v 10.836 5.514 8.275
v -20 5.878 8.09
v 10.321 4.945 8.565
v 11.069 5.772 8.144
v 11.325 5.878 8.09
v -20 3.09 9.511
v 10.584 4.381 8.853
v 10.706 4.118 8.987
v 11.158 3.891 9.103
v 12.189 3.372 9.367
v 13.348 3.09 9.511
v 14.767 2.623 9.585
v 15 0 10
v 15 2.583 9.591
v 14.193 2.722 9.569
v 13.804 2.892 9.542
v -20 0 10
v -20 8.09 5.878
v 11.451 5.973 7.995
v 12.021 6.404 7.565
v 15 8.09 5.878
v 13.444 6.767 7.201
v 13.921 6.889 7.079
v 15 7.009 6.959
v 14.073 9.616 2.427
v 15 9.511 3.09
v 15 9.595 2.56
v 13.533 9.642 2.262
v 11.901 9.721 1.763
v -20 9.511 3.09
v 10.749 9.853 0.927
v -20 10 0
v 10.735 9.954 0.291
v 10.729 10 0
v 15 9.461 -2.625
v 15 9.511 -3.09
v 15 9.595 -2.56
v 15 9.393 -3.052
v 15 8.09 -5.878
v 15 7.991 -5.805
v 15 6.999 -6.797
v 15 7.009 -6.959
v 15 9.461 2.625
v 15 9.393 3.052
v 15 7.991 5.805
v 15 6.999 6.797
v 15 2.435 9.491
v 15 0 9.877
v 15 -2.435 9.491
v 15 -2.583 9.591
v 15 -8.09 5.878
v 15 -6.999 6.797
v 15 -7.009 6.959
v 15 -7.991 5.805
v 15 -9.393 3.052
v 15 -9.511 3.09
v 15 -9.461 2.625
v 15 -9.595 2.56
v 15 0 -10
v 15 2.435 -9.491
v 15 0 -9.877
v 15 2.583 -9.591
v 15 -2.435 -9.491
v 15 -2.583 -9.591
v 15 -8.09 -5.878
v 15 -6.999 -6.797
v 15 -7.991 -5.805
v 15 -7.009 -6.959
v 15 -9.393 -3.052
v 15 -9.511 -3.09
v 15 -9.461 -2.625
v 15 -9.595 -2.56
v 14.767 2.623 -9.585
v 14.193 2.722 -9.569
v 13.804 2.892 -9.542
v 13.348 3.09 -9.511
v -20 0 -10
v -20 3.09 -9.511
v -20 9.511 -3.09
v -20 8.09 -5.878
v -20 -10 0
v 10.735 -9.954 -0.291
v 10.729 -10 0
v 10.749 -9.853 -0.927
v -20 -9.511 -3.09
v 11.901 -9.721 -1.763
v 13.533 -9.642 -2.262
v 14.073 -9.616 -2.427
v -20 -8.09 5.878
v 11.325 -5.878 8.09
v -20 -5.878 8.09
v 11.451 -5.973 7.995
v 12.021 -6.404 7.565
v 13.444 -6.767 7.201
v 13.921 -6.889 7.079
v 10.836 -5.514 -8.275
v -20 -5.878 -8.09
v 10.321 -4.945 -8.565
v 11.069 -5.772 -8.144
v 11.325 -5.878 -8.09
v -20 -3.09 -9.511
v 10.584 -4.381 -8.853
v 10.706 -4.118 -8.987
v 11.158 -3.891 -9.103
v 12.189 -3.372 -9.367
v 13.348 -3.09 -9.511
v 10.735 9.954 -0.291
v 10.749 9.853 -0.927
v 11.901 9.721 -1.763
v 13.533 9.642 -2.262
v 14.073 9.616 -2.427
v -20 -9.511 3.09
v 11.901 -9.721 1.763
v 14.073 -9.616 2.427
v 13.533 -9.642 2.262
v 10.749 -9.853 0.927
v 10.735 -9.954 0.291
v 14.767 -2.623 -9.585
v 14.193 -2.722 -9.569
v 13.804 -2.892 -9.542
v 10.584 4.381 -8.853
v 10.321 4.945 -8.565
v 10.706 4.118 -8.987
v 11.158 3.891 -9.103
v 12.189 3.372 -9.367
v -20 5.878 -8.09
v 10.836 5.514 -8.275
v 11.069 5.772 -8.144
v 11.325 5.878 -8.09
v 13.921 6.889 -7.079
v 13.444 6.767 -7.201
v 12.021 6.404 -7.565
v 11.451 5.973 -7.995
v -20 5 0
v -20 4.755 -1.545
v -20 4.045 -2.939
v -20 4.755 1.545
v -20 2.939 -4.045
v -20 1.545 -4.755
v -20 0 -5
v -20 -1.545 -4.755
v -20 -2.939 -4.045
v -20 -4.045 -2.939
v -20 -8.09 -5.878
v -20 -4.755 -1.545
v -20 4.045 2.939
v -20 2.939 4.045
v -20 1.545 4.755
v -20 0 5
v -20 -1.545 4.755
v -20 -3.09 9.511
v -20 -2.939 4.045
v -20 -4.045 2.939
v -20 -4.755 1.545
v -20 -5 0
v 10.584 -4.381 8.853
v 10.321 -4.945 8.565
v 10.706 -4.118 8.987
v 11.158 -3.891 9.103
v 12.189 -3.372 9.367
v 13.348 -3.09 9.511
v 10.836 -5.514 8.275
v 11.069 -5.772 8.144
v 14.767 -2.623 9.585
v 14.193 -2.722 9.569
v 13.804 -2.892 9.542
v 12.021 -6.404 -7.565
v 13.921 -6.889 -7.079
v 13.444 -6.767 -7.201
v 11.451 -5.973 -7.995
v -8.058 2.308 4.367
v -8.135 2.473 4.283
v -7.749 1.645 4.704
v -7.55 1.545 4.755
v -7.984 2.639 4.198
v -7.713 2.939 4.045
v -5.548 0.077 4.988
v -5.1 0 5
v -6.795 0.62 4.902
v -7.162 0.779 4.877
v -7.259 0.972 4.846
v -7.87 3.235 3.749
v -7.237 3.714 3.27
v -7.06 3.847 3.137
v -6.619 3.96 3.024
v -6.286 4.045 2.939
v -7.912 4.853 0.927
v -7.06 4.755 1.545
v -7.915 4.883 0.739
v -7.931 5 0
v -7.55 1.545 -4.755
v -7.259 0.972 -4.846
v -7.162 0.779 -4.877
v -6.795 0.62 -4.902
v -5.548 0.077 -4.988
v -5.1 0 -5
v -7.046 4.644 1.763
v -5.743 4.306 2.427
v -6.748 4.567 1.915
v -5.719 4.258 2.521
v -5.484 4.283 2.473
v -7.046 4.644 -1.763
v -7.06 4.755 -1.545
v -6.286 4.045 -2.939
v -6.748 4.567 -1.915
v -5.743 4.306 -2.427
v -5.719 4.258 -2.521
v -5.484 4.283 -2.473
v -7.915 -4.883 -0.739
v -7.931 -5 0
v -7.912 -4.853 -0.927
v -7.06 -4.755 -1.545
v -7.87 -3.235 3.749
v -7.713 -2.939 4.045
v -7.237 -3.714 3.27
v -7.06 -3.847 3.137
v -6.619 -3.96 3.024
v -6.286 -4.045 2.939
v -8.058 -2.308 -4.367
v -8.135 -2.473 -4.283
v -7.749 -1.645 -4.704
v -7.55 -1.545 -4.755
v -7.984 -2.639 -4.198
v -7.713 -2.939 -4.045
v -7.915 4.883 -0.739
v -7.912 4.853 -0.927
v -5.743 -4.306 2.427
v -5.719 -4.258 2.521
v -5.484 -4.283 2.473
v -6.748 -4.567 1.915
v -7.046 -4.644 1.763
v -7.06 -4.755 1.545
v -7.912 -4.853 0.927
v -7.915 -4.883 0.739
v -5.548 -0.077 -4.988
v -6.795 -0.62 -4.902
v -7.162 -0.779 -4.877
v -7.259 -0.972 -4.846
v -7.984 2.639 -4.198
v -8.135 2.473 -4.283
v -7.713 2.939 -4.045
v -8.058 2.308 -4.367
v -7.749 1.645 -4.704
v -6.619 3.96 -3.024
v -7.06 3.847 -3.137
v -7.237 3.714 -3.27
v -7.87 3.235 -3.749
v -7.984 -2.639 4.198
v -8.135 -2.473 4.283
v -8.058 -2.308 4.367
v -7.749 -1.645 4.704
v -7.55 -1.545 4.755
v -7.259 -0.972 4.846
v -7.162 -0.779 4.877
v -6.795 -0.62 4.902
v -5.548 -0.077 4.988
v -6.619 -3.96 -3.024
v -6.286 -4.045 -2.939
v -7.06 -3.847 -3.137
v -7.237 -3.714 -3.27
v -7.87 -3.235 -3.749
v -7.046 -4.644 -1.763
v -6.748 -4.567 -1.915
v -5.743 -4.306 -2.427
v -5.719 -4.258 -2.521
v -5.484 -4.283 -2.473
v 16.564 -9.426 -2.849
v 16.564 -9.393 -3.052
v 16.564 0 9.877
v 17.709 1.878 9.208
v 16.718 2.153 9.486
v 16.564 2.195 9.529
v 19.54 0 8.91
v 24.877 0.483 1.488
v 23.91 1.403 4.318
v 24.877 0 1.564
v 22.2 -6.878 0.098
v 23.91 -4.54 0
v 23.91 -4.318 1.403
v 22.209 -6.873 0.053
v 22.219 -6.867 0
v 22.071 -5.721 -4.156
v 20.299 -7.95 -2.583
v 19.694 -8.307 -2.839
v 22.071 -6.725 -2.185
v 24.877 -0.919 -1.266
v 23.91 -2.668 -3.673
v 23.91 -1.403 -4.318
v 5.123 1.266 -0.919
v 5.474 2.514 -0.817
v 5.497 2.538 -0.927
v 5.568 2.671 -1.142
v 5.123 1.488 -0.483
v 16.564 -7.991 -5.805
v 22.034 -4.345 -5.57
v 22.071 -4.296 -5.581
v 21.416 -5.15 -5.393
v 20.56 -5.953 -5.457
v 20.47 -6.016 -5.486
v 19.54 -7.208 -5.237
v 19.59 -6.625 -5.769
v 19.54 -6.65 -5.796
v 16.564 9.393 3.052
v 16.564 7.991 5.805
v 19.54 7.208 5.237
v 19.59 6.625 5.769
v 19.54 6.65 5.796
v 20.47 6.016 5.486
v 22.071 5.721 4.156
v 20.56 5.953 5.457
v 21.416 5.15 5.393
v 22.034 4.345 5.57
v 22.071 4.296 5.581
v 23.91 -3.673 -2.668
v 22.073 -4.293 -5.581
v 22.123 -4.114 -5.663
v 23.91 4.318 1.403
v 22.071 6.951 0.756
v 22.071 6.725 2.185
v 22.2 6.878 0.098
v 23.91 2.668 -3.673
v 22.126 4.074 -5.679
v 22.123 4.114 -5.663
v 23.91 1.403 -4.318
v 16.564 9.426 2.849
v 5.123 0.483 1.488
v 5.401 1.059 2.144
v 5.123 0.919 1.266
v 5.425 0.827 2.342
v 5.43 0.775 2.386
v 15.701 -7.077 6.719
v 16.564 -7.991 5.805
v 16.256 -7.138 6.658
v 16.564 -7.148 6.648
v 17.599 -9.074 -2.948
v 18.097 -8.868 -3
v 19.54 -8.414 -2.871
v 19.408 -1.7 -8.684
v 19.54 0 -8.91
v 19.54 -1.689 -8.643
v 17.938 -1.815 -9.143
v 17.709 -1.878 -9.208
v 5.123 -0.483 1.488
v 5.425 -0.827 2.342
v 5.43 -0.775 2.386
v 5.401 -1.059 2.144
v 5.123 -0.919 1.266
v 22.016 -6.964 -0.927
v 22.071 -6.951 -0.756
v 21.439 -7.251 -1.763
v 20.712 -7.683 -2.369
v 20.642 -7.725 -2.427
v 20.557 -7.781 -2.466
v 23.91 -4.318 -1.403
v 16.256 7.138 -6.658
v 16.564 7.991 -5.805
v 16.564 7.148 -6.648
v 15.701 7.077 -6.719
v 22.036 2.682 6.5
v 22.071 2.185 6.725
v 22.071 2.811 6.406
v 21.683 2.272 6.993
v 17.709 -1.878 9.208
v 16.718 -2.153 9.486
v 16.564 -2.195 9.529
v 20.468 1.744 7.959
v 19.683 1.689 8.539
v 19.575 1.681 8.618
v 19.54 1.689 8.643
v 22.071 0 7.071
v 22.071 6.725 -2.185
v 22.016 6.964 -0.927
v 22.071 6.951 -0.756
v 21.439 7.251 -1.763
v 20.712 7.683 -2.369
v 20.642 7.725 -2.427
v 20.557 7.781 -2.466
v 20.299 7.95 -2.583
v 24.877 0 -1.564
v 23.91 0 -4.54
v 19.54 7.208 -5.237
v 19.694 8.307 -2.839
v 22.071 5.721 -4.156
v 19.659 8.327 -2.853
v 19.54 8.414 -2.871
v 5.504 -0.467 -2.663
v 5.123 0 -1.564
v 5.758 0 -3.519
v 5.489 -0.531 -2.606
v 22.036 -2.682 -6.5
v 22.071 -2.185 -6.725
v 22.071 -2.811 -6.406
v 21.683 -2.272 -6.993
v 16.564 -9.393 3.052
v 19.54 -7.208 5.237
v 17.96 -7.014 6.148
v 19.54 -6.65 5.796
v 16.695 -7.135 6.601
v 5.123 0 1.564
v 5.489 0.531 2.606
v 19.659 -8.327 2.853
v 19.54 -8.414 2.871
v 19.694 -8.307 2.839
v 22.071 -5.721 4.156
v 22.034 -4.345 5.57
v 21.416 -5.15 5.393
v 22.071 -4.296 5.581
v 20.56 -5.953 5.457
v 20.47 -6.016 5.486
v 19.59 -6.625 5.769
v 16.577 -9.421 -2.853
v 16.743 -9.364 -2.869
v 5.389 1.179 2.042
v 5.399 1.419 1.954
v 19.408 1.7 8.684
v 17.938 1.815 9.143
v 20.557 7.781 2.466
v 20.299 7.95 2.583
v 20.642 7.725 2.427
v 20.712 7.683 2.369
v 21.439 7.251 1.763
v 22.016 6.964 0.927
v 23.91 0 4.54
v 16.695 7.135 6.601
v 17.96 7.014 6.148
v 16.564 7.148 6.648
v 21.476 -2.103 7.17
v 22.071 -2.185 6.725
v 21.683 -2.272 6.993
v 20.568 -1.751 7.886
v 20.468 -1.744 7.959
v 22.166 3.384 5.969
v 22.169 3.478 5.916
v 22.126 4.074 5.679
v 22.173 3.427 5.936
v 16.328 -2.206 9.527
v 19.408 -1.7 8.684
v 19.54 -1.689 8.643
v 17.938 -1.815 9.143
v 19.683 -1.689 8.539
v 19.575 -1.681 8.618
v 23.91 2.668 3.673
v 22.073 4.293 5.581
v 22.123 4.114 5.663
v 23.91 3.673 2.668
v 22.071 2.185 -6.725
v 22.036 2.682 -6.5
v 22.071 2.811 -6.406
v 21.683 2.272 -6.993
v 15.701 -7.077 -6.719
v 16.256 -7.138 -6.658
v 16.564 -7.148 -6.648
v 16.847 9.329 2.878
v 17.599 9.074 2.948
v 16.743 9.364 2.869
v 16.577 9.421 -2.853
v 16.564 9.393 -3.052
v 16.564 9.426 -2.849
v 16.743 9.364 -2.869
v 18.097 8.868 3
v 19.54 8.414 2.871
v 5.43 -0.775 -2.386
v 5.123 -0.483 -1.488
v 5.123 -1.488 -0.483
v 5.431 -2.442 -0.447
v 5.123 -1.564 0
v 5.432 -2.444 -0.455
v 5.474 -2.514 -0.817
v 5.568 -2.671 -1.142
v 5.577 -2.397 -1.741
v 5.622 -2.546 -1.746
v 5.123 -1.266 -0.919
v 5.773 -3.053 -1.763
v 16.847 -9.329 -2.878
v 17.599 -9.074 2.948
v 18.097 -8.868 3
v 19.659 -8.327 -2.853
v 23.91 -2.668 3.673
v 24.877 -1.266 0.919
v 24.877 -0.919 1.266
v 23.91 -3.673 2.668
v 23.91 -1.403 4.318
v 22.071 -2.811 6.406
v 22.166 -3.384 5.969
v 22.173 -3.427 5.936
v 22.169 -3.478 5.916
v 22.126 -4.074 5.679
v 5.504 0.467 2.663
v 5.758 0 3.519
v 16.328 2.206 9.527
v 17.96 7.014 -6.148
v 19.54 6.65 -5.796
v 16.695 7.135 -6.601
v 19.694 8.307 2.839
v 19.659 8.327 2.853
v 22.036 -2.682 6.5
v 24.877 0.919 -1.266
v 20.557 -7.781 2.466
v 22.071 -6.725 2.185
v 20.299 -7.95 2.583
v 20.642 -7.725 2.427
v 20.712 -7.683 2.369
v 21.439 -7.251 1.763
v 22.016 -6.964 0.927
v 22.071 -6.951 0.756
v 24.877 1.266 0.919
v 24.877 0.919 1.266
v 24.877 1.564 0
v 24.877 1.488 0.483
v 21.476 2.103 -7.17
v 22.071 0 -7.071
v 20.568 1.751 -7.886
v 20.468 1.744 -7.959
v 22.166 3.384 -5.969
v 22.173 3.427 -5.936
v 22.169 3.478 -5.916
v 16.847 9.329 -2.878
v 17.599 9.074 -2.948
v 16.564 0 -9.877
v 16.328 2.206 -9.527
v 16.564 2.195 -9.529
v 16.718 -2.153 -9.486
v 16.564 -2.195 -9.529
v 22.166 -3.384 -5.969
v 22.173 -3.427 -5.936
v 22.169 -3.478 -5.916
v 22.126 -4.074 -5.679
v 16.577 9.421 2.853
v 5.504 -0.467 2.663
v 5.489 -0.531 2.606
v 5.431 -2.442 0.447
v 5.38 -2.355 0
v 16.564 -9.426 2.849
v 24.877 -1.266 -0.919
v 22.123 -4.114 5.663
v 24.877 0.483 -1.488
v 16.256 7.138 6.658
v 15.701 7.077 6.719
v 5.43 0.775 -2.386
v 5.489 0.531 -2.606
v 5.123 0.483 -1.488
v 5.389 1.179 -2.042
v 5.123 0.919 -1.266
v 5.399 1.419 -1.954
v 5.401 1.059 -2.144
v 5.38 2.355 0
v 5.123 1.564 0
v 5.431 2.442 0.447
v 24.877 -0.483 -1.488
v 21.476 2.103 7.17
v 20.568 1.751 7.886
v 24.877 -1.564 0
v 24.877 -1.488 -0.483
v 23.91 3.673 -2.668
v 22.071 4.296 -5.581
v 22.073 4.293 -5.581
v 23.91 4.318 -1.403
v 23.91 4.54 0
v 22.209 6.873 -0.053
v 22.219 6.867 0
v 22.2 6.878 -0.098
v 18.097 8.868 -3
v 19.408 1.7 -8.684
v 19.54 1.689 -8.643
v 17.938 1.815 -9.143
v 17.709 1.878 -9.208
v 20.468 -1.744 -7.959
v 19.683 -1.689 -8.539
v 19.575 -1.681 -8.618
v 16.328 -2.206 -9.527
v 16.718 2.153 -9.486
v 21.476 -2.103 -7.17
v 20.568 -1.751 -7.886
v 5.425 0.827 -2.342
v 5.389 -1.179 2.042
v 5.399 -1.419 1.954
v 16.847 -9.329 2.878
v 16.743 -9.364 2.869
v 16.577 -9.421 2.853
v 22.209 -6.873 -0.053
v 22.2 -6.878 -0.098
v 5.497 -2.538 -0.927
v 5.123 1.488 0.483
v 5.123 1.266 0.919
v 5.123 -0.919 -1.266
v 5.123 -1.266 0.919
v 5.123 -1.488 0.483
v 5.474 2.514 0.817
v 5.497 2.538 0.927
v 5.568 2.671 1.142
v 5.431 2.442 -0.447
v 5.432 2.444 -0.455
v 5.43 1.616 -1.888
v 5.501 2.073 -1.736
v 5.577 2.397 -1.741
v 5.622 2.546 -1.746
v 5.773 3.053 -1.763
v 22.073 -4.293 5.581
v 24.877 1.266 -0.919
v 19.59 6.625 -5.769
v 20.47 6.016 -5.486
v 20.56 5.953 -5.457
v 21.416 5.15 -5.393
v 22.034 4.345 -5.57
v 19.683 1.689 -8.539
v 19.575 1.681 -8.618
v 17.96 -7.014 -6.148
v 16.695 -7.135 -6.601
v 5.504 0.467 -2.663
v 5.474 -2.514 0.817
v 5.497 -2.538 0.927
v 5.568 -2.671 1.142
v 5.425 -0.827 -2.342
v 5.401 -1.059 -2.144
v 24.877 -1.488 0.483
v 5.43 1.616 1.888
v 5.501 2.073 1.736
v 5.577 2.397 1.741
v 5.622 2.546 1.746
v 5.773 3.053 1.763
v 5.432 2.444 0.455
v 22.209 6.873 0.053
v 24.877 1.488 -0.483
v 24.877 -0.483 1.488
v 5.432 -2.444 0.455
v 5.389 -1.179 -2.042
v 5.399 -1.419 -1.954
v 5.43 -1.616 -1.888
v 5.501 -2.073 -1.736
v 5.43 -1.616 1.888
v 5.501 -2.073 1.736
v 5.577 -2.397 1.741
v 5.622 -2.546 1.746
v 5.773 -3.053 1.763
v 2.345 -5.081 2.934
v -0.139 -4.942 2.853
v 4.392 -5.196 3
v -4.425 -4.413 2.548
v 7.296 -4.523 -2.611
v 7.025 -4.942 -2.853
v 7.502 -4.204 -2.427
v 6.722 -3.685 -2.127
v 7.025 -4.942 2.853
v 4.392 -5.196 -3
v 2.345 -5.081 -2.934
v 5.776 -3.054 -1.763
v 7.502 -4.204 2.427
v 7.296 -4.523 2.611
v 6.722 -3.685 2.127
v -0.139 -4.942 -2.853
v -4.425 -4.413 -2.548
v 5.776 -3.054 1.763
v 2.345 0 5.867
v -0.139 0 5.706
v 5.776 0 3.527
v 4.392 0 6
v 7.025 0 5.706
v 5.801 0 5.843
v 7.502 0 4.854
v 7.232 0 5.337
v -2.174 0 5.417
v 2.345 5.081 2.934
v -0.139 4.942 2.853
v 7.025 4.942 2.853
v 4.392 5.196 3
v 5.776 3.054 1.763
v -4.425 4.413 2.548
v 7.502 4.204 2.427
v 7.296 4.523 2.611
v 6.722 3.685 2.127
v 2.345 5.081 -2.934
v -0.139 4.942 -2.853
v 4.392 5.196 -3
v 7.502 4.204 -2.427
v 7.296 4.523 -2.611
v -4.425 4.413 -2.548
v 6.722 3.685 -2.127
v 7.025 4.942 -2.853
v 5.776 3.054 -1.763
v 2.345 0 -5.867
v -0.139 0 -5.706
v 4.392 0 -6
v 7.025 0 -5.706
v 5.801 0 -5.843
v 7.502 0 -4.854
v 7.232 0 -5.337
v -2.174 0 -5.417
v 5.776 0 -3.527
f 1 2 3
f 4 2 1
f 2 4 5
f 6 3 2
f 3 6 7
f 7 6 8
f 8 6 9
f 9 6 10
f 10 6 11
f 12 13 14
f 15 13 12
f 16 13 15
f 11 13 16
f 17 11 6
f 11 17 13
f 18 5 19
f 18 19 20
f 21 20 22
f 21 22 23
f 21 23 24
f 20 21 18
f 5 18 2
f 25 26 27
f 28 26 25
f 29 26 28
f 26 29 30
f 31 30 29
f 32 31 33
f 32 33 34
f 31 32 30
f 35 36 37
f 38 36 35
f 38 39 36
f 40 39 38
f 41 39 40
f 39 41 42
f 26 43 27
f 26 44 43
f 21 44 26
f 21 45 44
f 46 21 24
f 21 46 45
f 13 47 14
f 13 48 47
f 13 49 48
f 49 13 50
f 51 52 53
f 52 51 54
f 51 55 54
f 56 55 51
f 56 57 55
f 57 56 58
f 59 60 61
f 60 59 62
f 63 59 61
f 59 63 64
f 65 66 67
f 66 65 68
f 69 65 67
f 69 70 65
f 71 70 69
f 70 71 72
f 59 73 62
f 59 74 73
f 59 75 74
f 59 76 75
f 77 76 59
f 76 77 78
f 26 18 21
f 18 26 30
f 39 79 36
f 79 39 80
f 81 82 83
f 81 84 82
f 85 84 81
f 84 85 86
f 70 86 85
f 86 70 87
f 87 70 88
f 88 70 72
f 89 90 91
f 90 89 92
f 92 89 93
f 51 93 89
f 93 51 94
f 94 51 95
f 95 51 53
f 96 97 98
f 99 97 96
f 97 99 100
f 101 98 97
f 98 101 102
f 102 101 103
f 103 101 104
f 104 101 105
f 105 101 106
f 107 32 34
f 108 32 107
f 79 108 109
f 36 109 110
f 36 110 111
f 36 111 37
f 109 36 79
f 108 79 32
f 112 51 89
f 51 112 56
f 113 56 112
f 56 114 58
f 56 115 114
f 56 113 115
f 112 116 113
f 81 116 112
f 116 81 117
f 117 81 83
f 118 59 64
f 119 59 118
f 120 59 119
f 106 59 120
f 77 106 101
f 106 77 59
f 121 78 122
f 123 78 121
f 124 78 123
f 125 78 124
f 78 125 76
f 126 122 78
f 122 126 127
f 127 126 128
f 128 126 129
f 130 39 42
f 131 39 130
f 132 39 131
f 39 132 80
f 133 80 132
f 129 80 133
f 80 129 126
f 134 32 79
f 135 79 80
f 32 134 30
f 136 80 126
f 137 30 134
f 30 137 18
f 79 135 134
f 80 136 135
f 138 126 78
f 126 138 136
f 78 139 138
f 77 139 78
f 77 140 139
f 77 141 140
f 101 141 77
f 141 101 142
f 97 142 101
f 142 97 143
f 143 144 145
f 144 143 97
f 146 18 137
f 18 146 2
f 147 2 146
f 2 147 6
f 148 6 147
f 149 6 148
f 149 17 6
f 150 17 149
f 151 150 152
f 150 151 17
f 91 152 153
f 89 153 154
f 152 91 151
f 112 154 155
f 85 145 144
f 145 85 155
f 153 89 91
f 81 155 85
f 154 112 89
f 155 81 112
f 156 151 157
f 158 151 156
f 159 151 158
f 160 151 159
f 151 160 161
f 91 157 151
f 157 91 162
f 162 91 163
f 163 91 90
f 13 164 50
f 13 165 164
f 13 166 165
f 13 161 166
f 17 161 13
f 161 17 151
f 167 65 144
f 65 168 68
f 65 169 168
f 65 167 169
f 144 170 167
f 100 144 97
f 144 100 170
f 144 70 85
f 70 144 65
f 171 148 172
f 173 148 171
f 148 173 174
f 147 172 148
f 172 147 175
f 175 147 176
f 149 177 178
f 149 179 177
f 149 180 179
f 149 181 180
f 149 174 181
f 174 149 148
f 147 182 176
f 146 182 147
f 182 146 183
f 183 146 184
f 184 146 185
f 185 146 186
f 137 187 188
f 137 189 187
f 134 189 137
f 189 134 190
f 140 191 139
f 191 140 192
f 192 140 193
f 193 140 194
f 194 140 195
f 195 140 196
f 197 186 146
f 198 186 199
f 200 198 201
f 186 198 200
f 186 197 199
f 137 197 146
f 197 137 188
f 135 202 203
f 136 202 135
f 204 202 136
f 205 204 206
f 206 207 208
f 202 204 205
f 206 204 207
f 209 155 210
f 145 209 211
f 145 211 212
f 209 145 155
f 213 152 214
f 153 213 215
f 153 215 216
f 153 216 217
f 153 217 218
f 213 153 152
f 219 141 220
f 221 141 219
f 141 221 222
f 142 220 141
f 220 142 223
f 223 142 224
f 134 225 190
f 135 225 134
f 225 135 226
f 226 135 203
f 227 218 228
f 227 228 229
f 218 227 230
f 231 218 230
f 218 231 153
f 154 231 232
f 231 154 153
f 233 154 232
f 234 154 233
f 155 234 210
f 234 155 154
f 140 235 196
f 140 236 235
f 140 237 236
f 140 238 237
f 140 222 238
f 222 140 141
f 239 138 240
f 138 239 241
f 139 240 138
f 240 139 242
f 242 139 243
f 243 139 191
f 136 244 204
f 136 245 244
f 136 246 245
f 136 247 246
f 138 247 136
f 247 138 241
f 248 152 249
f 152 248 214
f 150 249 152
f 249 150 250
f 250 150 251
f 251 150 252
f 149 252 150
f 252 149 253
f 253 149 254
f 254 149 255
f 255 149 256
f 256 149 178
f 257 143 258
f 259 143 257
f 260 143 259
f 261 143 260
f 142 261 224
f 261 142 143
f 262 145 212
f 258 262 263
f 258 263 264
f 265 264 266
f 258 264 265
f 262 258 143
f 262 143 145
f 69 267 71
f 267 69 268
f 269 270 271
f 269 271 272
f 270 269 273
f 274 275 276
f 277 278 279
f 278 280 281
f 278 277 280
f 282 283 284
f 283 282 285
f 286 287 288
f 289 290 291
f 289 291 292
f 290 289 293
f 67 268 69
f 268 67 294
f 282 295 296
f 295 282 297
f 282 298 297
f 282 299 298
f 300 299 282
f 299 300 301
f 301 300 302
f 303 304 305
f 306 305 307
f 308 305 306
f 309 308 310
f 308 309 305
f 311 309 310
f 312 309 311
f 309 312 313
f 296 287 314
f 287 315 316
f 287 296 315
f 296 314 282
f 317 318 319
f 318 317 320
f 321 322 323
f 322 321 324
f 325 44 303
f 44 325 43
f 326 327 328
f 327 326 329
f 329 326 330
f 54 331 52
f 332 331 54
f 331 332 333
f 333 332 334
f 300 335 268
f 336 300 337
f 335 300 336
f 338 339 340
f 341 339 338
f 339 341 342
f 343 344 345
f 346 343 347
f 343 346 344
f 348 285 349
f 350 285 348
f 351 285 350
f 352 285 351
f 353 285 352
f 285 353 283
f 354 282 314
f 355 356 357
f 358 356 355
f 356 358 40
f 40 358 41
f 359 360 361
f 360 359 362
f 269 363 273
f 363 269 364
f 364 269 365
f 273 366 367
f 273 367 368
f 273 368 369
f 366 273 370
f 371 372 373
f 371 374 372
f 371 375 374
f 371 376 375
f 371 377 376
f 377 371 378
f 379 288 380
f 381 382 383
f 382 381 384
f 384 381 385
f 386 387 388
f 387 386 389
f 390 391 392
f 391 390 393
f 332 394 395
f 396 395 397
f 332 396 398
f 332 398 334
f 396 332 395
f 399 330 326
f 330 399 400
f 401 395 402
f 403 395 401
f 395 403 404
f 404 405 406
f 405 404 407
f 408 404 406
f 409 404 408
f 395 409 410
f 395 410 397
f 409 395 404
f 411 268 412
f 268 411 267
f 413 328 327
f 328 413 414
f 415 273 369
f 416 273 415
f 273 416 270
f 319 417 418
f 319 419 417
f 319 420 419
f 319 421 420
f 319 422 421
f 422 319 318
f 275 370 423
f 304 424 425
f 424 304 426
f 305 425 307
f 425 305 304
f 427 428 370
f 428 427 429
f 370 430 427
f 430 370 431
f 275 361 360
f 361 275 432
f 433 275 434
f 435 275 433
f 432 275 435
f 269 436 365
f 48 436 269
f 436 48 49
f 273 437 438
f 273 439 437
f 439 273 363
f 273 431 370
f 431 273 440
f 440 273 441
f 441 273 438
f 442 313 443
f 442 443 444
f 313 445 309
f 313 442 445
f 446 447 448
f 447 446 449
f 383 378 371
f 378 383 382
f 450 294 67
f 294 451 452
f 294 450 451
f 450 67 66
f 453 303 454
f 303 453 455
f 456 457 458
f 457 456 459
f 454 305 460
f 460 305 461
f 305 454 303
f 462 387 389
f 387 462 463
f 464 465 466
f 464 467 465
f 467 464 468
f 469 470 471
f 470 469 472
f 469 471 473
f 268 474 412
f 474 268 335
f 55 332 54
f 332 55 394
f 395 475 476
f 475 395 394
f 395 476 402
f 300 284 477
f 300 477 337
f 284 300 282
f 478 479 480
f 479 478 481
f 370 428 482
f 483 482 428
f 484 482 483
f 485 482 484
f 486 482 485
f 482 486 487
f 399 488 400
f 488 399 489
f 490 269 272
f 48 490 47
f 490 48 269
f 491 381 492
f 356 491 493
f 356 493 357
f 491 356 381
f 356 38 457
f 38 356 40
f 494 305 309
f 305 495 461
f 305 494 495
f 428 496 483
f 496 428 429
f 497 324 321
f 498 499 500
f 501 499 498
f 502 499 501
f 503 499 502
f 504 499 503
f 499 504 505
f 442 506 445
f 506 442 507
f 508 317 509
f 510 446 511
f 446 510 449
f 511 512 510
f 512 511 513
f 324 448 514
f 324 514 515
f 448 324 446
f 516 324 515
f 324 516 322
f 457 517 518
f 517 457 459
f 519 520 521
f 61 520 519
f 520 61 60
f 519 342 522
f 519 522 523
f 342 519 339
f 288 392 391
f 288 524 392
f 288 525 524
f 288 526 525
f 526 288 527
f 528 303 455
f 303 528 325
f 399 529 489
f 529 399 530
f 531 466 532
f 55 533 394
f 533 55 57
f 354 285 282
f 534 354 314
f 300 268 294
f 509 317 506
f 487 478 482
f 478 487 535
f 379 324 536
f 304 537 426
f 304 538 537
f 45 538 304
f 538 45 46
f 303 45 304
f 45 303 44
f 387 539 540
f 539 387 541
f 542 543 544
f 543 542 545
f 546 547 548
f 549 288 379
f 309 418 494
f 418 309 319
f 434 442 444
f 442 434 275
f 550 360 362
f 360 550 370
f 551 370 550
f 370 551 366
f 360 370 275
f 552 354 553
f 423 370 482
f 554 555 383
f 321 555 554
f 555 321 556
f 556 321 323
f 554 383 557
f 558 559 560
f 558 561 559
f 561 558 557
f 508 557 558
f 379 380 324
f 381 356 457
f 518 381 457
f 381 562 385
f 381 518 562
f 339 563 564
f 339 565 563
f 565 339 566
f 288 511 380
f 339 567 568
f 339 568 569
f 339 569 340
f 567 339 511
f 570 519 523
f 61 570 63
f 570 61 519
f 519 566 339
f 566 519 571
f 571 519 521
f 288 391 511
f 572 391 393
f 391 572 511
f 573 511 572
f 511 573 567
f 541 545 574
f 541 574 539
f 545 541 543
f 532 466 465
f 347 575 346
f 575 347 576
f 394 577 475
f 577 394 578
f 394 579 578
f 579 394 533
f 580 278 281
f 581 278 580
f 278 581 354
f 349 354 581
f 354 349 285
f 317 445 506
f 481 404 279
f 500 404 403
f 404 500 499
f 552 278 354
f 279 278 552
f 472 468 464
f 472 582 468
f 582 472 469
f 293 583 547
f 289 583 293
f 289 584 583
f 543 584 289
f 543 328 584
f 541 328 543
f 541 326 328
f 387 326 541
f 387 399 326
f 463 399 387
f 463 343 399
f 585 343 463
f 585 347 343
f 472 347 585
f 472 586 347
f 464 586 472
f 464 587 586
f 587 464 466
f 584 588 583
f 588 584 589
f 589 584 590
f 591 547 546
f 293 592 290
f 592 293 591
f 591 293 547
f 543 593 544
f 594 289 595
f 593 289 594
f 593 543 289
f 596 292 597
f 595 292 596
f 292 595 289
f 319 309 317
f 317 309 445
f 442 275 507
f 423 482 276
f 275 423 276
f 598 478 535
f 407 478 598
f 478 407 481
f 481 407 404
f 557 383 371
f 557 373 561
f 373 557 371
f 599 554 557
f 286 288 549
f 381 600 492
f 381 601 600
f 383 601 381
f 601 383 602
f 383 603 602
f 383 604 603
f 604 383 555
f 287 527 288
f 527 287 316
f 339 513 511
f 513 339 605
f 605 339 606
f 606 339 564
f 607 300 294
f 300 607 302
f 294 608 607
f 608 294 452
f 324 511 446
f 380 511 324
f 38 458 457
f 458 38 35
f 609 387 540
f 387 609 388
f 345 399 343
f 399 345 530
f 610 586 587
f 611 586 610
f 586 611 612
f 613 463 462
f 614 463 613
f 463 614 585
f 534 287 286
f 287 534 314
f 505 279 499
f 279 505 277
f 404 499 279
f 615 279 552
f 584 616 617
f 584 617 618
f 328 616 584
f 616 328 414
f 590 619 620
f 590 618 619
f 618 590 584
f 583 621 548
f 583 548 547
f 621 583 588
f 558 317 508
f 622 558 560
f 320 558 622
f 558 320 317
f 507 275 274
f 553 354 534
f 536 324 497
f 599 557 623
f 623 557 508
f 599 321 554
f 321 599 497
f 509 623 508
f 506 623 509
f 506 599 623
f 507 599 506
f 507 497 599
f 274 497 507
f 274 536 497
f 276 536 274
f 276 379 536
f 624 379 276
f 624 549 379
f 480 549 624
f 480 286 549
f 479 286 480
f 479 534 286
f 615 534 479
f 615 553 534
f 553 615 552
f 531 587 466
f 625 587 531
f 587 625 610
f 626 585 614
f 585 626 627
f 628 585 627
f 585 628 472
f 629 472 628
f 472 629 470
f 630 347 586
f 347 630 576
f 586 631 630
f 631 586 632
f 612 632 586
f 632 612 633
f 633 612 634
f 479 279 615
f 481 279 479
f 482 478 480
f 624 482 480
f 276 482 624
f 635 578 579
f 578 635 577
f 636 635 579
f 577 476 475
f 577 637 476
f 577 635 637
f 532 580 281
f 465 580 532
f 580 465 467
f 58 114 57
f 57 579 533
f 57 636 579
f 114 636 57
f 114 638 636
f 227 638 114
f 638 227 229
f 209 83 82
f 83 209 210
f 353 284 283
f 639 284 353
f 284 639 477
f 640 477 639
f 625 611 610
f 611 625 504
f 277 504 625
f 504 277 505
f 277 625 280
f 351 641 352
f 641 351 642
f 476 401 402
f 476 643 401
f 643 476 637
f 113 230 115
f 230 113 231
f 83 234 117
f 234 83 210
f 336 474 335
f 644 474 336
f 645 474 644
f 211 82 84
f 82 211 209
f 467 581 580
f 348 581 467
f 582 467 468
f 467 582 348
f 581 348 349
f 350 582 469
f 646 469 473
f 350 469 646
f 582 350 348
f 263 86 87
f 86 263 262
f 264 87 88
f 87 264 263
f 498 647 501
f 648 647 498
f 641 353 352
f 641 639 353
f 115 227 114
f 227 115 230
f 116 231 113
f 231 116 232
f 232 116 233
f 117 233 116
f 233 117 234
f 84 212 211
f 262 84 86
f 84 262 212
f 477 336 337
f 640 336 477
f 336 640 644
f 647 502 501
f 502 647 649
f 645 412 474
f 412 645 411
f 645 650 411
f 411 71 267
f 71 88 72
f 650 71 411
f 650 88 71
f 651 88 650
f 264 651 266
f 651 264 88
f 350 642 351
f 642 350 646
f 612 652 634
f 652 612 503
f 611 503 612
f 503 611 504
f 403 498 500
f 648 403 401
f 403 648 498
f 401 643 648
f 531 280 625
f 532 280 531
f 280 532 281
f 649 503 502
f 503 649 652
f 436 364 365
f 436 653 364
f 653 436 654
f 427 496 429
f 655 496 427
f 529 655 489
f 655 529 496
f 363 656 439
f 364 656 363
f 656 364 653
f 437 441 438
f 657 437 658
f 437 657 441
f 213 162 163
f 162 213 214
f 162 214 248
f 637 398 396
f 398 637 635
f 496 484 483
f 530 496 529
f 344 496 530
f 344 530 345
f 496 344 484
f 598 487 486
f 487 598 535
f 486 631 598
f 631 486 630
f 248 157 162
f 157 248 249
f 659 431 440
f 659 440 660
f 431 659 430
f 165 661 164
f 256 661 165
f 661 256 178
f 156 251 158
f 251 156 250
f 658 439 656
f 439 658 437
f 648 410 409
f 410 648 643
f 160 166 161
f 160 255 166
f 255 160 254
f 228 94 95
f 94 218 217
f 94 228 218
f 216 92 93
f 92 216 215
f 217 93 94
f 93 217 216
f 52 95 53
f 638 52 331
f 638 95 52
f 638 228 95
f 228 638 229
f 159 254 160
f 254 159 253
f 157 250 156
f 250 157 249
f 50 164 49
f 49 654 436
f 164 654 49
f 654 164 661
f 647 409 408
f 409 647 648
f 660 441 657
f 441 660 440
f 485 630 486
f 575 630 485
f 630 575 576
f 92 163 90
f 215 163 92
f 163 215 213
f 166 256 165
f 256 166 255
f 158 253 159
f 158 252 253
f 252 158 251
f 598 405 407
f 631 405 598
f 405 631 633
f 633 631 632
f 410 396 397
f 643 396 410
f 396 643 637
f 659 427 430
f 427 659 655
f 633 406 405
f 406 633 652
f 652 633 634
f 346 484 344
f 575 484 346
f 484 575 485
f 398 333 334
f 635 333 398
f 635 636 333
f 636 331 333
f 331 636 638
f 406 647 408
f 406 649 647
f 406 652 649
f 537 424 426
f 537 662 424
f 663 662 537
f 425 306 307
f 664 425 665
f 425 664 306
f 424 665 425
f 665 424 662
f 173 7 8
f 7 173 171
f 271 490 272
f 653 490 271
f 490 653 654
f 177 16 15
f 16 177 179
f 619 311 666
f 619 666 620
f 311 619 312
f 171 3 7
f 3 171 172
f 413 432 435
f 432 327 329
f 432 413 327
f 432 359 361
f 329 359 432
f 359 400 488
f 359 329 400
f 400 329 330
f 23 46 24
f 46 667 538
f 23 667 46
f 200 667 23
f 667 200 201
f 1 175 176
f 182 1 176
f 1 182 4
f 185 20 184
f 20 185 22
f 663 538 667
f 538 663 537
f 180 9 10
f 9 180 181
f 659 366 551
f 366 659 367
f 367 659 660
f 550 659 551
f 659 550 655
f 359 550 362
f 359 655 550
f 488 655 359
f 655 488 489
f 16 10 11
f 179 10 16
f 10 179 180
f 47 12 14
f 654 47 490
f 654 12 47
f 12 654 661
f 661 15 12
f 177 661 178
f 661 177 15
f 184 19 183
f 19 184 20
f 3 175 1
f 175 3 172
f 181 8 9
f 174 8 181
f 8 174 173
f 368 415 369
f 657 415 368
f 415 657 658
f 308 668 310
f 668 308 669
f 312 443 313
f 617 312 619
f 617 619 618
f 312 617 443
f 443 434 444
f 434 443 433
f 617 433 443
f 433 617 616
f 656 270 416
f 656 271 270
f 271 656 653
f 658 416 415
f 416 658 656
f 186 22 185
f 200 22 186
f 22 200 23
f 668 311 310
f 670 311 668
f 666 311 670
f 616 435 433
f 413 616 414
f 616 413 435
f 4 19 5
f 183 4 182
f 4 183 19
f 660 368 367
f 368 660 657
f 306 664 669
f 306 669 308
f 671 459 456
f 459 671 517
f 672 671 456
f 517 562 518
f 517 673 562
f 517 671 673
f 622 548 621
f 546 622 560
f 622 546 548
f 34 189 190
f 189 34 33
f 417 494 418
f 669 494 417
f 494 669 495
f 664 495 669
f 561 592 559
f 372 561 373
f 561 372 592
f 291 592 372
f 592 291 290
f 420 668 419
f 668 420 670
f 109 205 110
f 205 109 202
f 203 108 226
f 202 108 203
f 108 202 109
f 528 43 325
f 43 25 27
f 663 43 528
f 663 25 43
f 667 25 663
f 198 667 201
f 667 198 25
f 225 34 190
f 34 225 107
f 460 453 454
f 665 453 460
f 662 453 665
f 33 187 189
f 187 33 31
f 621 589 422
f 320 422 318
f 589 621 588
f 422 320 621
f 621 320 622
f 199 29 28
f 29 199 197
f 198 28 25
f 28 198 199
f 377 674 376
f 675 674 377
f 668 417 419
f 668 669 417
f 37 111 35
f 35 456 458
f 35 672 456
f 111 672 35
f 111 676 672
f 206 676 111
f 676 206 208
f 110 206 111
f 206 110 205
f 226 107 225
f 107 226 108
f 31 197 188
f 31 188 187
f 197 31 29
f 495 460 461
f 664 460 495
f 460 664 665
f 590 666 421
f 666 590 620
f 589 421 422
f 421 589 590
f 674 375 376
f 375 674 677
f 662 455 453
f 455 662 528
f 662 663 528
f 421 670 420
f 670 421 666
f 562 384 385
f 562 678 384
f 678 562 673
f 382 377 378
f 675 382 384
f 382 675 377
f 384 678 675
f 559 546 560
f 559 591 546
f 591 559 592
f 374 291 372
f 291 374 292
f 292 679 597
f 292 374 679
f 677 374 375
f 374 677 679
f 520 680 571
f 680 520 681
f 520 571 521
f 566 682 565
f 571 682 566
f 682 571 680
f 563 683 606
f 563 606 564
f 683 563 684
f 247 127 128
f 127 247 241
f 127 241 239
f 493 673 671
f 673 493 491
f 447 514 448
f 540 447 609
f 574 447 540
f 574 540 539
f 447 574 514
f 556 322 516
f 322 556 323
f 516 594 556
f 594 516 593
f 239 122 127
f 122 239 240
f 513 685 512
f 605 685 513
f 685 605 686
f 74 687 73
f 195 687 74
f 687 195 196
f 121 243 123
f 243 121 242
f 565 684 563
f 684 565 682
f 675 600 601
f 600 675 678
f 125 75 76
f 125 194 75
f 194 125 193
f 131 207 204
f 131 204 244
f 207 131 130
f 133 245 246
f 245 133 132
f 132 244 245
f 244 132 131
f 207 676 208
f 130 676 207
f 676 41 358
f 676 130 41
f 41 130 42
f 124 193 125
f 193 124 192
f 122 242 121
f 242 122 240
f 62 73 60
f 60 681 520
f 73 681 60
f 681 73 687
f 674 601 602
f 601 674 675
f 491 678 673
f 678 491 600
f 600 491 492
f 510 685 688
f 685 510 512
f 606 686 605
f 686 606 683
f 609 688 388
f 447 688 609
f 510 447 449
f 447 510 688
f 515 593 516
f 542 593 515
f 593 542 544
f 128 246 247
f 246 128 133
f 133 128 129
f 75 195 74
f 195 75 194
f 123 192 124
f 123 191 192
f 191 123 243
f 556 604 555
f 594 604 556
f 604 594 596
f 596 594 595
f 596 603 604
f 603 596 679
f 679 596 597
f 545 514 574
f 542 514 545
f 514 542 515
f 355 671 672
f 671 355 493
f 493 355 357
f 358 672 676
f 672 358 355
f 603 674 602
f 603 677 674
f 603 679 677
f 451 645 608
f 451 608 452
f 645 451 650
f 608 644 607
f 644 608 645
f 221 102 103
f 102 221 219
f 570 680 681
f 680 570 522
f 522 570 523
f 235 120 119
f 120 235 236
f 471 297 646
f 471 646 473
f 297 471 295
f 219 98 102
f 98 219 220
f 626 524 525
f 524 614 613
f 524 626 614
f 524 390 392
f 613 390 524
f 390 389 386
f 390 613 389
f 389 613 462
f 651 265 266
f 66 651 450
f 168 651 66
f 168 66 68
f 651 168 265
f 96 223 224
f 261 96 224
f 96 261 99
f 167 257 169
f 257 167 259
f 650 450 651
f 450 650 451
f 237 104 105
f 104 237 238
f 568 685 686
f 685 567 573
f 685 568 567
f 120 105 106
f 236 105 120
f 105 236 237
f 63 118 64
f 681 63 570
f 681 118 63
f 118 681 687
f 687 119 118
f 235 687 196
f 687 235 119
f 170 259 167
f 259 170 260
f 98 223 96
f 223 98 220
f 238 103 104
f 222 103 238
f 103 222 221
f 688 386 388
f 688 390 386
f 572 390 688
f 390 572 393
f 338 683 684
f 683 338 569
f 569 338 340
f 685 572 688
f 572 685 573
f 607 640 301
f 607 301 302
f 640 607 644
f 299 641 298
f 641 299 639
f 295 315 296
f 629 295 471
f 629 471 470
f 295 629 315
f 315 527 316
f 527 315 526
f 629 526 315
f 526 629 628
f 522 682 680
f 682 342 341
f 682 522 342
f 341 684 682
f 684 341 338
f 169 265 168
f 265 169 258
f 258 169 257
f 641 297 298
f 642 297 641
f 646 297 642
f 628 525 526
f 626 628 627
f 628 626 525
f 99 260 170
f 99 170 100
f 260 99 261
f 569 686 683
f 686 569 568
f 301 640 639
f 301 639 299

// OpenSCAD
$fn=20;

difference() {
    union() {
        translate([15,0,0]) {
            rotate([0, -90, 0]) {
                ports = 6;
                difference()
                {
                    union() {
                        sphere(d=20);
                        difference() {
                            cylinder(d=20, h=35);
                            cylinder(d=10, h=35);
                        }
                    }
                    
                    for(i=[0:ports]) {
                        translate([0, 0, 30]) {
                            rotate([180-15,0,360/ports * i]) {
                                cylinder(d=6, h=40);
                            }
                        }    
                    }
                }
            }
        }

        rotate([0, 0, 90]) {
            translate([-20, -20, 0]) {
                size = 40;
                thickness = 5;
                intersection() {
                    translate([size/2, size/2, 0]) {
                        cube([size, size, size], center=true);
                    }

                    rotate_extrude() {
                        translate([size/2, 0, 0]) {
                            difference() {
                                circle(d=size);
                                circle(d=size-thickness*2);
                            }
                        }
                    }
                }
            }
        }
    }
    
    rotate([0, -90, 0]) {
        cylinder(d=10, h=25);
    }
}
